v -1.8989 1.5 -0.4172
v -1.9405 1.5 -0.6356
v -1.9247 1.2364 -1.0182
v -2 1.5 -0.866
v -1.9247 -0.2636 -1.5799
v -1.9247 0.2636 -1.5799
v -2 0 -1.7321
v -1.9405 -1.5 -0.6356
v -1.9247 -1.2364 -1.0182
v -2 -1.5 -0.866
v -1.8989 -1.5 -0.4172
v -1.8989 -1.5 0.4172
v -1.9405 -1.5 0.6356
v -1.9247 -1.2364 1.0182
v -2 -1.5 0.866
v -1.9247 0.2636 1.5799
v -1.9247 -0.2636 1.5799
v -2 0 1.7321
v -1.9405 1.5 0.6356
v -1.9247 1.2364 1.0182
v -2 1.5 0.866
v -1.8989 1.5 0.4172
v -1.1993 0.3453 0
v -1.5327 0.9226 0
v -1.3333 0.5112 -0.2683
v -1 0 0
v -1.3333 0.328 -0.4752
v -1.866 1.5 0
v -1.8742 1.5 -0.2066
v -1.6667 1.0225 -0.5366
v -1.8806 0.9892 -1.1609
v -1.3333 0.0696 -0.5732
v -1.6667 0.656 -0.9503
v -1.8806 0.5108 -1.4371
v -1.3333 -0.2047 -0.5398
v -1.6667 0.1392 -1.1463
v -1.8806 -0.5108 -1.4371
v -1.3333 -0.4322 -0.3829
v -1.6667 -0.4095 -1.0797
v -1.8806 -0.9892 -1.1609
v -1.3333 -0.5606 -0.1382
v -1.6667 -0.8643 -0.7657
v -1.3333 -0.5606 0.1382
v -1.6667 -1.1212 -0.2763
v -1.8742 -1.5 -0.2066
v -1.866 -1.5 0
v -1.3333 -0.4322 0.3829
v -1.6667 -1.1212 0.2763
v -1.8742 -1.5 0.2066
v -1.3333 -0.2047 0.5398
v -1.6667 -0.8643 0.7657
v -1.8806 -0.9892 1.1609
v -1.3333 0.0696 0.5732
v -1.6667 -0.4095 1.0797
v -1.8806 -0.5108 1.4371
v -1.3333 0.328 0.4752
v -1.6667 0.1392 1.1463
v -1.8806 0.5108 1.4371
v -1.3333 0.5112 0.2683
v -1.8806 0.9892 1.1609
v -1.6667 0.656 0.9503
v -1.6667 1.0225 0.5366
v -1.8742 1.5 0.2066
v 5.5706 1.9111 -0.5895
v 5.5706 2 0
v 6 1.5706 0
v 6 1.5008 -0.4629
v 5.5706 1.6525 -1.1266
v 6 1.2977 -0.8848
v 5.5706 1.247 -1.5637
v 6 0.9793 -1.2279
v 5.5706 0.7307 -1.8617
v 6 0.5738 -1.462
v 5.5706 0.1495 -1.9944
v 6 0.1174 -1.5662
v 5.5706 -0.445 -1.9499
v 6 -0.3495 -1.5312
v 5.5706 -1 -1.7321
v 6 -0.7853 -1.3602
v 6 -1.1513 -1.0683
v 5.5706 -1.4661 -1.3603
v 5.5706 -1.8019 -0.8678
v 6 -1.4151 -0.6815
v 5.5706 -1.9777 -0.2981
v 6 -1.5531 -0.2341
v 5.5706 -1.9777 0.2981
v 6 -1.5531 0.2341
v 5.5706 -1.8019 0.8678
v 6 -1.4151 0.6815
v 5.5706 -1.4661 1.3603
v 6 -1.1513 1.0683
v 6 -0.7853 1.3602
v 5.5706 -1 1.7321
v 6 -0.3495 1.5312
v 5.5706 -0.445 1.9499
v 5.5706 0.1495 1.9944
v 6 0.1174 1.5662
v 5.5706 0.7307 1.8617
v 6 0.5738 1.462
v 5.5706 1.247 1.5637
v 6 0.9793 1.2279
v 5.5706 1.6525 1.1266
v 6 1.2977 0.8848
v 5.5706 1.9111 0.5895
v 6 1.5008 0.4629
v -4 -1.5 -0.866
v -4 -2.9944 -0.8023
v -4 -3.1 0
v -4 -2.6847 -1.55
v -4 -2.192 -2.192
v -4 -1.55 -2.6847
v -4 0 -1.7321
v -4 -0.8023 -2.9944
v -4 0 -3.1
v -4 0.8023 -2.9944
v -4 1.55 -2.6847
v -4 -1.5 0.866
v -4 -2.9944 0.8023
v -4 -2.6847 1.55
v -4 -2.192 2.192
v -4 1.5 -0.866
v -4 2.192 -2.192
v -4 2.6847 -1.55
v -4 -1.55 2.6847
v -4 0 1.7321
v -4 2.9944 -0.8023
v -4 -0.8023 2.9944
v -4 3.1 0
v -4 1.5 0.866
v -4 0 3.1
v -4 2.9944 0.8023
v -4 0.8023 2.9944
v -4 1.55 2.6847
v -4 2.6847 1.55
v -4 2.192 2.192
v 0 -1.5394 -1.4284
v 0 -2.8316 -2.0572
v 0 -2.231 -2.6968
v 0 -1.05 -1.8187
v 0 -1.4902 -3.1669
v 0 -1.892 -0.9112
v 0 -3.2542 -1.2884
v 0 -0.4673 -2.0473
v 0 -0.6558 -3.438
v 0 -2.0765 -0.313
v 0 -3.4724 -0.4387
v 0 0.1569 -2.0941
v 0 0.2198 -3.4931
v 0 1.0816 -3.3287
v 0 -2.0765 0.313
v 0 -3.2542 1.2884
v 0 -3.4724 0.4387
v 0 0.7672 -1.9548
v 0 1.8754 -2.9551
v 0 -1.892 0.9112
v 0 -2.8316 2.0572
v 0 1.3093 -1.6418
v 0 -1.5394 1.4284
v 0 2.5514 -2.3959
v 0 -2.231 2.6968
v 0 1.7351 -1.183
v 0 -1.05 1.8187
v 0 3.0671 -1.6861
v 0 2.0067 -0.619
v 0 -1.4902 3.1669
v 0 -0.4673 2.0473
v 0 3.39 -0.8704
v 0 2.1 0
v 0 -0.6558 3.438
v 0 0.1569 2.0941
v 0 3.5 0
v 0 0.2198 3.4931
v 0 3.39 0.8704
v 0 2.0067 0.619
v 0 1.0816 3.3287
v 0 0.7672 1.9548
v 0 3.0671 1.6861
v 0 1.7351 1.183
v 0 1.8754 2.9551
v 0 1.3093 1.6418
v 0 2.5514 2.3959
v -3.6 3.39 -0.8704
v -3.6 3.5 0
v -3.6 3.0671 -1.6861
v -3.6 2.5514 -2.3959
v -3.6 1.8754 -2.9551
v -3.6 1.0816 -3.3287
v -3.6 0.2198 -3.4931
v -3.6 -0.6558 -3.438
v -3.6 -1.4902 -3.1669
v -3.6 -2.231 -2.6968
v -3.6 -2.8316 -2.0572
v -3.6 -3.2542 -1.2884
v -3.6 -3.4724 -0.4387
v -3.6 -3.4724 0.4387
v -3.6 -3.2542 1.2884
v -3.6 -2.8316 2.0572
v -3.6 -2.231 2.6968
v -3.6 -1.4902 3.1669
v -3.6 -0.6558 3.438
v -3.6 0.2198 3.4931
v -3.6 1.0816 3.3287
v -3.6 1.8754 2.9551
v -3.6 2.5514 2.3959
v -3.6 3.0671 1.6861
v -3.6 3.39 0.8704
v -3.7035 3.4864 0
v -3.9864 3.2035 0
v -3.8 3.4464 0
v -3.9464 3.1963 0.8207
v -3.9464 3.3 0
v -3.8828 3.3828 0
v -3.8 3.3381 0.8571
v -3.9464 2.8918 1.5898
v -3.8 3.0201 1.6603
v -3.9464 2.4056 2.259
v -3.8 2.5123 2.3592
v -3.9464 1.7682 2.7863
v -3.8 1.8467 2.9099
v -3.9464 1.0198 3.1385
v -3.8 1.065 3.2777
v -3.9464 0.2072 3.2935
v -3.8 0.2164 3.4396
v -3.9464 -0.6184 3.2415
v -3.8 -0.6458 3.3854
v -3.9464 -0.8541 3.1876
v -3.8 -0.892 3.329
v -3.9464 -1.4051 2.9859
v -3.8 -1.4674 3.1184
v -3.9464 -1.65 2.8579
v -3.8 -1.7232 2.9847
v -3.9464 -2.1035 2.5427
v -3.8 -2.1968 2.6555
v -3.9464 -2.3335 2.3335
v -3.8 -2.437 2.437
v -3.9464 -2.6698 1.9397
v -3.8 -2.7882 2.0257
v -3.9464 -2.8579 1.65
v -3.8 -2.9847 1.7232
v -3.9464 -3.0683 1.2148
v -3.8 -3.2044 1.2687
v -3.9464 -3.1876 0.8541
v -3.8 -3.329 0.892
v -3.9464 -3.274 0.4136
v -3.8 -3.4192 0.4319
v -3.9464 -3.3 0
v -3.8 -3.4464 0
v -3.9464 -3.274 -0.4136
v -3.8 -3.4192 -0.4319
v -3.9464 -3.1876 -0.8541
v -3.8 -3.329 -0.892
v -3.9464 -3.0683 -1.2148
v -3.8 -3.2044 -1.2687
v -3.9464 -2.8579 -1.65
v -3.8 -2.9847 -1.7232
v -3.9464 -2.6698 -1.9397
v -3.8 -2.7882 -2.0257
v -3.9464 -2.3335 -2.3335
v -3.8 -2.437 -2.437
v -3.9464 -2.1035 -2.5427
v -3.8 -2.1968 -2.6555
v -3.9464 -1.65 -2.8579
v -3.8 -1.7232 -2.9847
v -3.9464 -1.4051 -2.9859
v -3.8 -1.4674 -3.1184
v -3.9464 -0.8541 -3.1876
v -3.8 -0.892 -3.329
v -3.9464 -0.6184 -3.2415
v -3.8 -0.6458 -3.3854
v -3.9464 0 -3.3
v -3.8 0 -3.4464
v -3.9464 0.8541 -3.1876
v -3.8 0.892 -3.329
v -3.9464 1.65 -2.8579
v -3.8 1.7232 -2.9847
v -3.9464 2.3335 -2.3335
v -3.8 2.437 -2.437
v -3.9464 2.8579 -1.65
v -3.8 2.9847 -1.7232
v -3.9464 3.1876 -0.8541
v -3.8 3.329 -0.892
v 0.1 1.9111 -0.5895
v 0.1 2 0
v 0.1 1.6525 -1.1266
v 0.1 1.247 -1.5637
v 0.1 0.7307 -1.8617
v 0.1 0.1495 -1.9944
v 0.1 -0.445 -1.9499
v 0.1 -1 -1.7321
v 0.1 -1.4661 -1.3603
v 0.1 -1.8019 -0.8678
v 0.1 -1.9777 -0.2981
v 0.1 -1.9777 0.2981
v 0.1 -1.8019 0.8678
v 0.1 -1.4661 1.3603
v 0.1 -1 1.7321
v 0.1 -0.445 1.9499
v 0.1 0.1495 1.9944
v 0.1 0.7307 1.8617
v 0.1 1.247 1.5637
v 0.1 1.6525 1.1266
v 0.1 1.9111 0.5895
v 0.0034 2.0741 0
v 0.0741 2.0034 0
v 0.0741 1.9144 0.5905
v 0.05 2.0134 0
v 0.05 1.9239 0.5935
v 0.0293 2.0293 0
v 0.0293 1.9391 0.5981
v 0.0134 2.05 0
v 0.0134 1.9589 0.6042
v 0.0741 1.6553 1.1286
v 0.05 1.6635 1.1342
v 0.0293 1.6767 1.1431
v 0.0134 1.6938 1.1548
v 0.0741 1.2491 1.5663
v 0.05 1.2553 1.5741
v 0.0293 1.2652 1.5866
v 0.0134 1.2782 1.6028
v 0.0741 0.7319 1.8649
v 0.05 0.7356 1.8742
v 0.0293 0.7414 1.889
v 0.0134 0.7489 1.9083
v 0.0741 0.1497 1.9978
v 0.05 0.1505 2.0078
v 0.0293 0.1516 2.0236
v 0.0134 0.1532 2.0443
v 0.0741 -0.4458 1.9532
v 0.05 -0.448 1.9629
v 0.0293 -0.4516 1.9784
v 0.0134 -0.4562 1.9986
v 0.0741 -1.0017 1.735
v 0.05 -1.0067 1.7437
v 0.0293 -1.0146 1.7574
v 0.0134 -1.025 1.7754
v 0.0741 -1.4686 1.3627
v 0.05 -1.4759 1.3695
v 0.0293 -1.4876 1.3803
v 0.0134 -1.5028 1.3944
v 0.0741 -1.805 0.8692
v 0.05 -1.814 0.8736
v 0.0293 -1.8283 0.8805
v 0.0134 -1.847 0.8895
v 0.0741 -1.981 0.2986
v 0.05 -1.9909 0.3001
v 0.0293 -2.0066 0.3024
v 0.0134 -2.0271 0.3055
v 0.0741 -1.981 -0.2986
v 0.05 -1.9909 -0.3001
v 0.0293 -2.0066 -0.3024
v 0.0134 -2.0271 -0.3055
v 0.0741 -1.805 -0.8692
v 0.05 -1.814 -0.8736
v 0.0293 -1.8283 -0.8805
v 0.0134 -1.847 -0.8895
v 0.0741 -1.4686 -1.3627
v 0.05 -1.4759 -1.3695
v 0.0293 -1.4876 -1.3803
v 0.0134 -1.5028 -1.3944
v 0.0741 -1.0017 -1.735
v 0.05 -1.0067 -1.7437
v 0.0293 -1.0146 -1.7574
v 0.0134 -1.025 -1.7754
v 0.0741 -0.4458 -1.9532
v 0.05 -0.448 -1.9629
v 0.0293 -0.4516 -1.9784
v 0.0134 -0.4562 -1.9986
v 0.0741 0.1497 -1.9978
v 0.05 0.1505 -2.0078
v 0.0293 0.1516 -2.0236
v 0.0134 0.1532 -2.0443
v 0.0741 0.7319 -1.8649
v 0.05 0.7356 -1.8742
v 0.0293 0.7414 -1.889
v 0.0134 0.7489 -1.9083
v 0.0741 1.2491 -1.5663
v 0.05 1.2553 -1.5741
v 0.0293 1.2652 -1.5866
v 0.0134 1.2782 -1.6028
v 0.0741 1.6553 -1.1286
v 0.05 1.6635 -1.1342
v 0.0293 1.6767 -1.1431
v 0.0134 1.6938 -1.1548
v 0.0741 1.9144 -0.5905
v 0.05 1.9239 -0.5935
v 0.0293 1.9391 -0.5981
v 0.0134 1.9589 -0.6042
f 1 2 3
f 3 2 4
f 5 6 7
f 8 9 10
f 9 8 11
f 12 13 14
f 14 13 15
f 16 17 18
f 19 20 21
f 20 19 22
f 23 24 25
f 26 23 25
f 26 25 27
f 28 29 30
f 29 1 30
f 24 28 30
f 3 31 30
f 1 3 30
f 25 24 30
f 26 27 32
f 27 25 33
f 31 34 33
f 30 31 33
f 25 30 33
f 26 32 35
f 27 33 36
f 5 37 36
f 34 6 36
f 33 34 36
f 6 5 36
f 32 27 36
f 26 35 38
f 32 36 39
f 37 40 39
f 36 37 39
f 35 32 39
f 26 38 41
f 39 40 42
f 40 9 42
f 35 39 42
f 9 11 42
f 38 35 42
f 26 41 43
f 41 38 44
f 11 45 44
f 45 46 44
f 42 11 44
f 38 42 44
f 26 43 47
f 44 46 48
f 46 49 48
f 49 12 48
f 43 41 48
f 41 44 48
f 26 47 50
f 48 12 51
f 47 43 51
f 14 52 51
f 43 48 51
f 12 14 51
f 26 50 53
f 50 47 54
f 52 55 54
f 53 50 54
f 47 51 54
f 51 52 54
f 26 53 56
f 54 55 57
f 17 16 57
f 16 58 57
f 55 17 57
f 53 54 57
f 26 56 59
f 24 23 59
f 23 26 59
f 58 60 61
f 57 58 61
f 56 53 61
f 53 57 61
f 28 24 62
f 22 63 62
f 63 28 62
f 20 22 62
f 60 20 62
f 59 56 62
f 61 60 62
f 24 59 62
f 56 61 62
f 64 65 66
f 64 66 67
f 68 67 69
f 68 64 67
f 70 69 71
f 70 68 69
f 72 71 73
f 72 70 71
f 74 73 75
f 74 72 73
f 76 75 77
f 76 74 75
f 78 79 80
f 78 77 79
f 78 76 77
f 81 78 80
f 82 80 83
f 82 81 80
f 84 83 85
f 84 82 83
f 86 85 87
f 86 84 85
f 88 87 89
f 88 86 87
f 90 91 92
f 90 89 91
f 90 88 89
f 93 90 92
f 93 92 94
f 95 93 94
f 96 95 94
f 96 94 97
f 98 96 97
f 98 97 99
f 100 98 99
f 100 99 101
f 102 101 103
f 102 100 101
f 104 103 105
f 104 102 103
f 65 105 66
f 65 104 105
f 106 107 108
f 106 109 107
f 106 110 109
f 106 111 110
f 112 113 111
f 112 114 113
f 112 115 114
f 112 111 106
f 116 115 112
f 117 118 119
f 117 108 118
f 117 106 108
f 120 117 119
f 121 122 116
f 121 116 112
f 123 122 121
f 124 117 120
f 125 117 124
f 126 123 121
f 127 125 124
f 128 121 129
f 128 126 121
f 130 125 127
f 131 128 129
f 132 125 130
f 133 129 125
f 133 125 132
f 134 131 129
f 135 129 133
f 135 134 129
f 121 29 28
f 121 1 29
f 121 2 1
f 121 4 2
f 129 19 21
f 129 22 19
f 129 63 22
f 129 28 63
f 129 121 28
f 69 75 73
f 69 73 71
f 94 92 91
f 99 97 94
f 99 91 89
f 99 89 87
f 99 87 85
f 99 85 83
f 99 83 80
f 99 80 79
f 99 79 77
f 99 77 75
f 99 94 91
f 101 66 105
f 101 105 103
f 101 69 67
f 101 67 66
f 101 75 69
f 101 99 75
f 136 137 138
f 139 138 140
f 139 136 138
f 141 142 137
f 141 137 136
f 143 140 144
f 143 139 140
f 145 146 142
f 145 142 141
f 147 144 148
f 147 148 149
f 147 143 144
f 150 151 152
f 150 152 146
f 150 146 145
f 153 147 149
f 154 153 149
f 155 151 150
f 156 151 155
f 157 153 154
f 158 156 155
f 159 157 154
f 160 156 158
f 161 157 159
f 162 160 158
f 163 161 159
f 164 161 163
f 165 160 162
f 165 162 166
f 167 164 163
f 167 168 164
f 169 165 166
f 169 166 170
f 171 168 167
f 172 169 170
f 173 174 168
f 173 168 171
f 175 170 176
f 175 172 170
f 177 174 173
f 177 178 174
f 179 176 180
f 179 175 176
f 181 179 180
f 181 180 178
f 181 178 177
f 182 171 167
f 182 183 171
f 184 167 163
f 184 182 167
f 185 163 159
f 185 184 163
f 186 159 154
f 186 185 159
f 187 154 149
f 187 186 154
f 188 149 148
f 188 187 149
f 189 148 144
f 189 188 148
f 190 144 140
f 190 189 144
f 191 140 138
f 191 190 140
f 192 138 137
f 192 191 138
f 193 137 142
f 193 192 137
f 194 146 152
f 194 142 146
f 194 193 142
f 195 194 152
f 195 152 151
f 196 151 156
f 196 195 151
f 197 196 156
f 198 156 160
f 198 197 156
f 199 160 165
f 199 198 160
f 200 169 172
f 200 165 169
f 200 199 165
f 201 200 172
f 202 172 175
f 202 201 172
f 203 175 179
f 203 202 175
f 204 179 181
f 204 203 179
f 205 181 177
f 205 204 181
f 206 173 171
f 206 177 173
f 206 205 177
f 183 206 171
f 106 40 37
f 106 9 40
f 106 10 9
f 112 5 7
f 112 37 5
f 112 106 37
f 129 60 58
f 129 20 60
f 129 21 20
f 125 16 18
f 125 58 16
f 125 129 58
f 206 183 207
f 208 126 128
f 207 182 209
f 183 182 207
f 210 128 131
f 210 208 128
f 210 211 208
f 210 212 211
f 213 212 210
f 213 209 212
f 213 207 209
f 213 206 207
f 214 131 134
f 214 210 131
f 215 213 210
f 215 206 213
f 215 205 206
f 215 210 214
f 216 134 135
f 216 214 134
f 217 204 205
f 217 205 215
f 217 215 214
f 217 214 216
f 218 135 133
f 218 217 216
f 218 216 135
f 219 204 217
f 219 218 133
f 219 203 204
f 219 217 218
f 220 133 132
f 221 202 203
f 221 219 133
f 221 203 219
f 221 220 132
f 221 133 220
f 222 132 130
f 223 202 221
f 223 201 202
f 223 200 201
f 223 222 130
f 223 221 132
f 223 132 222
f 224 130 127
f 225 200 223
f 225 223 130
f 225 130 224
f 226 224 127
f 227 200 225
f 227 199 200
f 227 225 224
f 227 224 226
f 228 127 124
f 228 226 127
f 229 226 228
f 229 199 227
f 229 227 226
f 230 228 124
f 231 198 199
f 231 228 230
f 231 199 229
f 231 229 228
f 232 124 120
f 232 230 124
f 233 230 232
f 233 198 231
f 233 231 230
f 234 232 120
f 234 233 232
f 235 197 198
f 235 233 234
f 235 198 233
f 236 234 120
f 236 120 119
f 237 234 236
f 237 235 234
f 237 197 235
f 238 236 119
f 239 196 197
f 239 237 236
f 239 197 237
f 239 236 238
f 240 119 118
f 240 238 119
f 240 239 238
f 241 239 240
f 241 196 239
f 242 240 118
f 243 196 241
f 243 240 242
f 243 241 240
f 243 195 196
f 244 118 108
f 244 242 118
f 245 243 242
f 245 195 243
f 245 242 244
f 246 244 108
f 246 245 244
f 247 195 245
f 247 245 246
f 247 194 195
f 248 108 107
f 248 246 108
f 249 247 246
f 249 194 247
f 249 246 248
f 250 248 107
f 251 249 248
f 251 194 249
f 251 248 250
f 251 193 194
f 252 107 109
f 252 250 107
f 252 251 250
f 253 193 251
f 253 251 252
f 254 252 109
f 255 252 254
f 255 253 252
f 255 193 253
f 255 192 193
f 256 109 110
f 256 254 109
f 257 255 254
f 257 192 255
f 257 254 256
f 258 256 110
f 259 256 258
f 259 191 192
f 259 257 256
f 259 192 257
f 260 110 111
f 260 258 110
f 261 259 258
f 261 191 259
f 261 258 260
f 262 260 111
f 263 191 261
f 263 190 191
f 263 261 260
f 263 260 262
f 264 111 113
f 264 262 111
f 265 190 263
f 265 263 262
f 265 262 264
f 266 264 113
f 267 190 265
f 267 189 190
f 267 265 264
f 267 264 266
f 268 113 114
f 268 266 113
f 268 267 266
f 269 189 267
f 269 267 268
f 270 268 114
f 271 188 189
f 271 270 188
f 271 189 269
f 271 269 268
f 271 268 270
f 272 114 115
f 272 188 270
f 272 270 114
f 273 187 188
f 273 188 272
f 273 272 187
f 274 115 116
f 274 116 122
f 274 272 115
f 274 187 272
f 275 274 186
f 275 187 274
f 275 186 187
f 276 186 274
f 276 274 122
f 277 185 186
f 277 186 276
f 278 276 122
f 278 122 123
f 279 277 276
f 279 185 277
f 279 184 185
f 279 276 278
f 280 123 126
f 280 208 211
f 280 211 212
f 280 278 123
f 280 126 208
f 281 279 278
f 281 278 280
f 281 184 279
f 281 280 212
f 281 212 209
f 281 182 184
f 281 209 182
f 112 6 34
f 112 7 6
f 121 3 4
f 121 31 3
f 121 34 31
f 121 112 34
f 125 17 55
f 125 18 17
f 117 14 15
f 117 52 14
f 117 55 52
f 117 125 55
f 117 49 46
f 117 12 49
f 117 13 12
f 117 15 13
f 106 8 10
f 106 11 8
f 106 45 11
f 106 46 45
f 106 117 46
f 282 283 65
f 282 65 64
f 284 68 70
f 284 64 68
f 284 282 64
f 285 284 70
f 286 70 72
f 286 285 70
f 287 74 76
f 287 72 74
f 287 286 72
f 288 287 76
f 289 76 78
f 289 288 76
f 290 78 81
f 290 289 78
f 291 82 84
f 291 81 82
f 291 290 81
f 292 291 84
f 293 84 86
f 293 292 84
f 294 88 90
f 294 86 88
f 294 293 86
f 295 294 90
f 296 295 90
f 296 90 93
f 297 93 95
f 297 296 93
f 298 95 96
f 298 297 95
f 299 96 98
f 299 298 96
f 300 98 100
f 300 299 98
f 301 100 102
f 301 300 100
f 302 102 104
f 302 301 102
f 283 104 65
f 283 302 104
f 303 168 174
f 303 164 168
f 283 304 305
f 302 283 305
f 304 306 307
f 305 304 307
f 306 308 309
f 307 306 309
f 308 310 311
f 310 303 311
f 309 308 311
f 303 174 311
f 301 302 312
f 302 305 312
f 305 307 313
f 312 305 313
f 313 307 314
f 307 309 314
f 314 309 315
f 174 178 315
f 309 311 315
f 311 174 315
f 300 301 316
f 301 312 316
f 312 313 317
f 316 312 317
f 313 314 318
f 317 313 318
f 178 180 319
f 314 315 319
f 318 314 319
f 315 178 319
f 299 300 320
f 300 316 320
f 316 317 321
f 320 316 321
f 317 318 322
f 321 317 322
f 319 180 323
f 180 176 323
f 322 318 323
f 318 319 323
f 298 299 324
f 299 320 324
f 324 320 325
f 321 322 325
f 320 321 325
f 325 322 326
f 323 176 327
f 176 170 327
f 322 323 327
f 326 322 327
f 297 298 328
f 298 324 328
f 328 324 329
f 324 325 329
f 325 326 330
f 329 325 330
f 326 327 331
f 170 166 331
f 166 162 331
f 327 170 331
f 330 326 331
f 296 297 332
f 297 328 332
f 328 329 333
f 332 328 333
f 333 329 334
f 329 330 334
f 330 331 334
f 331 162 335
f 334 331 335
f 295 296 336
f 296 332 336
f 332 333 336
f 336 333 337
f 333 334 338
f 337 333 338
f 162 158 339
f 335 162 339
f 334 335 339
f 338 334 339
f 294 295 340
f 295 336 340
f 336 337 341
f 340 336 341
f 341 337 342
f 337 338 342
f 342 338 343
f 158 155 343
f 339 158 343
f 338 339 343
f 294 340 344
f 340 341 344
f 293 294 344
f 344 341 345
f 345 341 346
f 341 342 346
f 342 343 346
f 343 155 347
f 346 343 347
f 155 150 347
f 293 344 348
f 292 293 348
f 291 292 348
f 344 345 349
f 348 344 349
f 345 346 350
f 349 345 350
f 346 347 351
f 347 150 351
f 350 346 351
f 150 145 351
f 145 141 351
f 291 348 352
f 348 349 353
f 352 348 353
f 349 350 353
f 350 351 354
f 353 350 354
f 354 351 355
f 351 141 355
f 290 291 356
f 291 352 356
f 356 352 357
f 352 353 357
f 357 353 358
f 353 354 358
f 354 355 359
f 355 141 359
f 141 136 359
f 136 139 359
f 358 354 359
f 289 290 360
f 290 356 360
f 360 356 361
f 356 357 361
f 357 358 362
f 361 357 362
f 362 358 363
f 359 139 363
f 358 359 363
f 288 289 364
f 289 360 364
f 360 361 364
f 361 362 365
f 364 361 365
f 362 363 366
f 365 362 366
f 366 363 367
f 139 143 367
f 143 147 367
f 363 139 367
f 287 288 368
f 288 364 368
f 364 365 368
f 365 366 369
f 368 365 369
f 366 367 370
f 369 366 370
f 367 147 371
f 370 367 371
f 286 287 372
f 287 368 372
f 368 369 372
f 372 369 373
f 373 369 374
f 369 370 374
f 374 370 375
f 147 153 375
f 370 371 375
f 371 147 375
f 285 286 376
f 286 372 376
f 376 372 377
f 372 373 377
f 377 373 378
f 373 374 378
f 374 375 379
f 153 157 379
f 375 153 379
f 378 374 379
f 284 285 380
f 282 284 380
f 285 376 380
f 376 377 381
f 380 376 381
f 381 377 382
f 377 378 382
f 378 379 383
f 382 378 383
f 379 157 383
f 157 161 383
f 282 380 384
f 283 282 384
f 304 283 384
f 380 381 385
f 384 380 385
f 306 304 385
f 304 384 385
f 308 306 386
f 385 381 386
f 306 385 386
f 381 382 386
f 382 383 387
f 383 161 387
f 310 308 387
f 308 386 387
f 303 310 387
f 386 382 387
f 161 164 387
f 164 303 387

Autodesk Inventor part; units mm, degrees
ref_plane "YZ Plane" through (0, 0, 0) normal (1, 0, 0) x (0, 1, 0)
ref_plane "XZ Plane" through (0, 0, 0) normal (0, 1, 0) x (-1, 0, 0)
sketch "Эскиз1" plane through (0, 0, 0) normal (0, 0, 1) x (1, 0, 0)
  line L0 (-1, 0) -> (6, 0)
  line L1 (6, 0) -> (6, 2)
  line L2 (6, 2) -> (2.1, 2)
  line L3 (2.1, 2) -> (1.6705, 2)
  line L4 (1.6705, 2) -> (0, 2)
  line L5 (0, 2) -> (0, 3.5)
  line L6 (0, 3.5) -> (-4, 3.5)
  line L7 (-4, 3.5) -> (-4, 1.7321)
  line L8 (-4, 1.7321) -> (-2, 1.7321)
  line L9 (-2, 1.7321) -> (-1, 0)
  line L10 (-6, 0) -> (8, 0) projected
  line L11 (0, -0.7) -> (0, 4.2) projected
  line L12 (2.1, 2) -> (0, 2) construction
  dimension "d1" = 3.9
  dimension "d2" = 0.4295
  dimension "d3" = 4
  dimension "d4" = 2
  dimension "d5" = 60
  dimension "d6" = 4
  dimension "d7" = 4
  dimension "d8" = 3.4641
  dimension "d9" = 7
  dimension "d26" = 6
revolve "Базовый элемент" add sketch "Эскиз1" angle 360 about axis through (-1, 0, 0) along (1, 0, 0)
sketch "Эскиз2" plane through (-4, 0, 0) normal (-1, 0, 0) x (0, 0, 1)
  circle A0 centre (0, 0) radius 1.7321 projected
  line L0 (0, -4.9) -> (0, 4.9) projected
  line L1 (-4.9, 0) -> (4.9, 0) projected
  line L2 (1.7321, 0) -> (0.866, -1.5)
  line L3 (0.866, -1.5) -> (-0.866, -1.5)
  line L4 (-0.866, -1.5) -> (-1.7321, 0)
  line L5 (-1.7321, 0) -> (-0.866, 1.5)
  line L6 (-0.866, 1.5) -> (0.866, 1.5)
  line L7 (0.866, 1.5) -> (1.7321, 0)
extrude "Паз" add sketch "Эскиз2" against normal up to next contours L7 A0 | A0 L2 | L6 L0 A0 | A0 L0 L3 | L0 L6 A0 | A0 L3 L0 | L4 A0 | A0 L5
fillet "Сопряжение1" radius 0.4 1 edges at (-4, -3.5, 0)
thread "Резьба" size "M4x0.7" class "6g" standard "ISO Metric profile" length 3.9
chamfer "Фаска1" distance 0.4294 distance2 0.4294 1 edges at (6, -2, 0) measured on face at (6, 0.556, 0.0273)
ref_plane "Work Plane1" through (29, 0, 0) normal (0, -1, 0) x (1, 0, 0)
fillet "Fillet2" radius 0.1 1 edges at (0, -2, 0)
equation "\"d1\" = GEL"
equation "\"d3\" = KOH"
equation "\"d4\" = INTI"
equation "\"d6\" = GD"
equation "\"d7\" = BDM"
equation "\"d8\" = 1.1547 * SW"
equation "\"d9\" = KOD"
equation "\"d26\" = NLG"
equation "\"d30\" = R"
equation "\"d17\" = RR"
equation "\"d13\" = GEL"
equation "\"d15\" = -0.5 * SPD + 0.5 * GD"
equation "\"d16\" = GUL"
equation "\"GD\" = NND"
equation "\"NLG\" = 6"
equation "\"GEL\" = 3.9"
equation "\"KOD\" = 7"
equation "\"KOH\" = NND"
equation "\"INTI\" = 2"
equation "\"GAL\" = 0.61345 * PTC"
equation "\"GUL\" = 0.61345 * PTC"
equation "\"BDM\" = NND"
equation "\"SW\" = 3"
equation "\"RR\" = 0.4"
equation "\"SPD\" = NND - 1.2269 * PTC"
equation "\"R\" = 0.1"
equation "\"TOA\" = 30deg"
equation "\"GD1\" = THREADDIA - 1.2269 * PTC"
equation "\"THREADDIA\" = 4"
equation "\"FAWI\" = 45deg"
equation "\"PTC\" = 0.7"
equation "\"NND\" = 4"
equation "\"E0\" = 1.155 * SW"
equation "\"PHH\" = 0"
properties part number "CSN 02 1143 - M4 x 6" material "Сталь, мягкая"
